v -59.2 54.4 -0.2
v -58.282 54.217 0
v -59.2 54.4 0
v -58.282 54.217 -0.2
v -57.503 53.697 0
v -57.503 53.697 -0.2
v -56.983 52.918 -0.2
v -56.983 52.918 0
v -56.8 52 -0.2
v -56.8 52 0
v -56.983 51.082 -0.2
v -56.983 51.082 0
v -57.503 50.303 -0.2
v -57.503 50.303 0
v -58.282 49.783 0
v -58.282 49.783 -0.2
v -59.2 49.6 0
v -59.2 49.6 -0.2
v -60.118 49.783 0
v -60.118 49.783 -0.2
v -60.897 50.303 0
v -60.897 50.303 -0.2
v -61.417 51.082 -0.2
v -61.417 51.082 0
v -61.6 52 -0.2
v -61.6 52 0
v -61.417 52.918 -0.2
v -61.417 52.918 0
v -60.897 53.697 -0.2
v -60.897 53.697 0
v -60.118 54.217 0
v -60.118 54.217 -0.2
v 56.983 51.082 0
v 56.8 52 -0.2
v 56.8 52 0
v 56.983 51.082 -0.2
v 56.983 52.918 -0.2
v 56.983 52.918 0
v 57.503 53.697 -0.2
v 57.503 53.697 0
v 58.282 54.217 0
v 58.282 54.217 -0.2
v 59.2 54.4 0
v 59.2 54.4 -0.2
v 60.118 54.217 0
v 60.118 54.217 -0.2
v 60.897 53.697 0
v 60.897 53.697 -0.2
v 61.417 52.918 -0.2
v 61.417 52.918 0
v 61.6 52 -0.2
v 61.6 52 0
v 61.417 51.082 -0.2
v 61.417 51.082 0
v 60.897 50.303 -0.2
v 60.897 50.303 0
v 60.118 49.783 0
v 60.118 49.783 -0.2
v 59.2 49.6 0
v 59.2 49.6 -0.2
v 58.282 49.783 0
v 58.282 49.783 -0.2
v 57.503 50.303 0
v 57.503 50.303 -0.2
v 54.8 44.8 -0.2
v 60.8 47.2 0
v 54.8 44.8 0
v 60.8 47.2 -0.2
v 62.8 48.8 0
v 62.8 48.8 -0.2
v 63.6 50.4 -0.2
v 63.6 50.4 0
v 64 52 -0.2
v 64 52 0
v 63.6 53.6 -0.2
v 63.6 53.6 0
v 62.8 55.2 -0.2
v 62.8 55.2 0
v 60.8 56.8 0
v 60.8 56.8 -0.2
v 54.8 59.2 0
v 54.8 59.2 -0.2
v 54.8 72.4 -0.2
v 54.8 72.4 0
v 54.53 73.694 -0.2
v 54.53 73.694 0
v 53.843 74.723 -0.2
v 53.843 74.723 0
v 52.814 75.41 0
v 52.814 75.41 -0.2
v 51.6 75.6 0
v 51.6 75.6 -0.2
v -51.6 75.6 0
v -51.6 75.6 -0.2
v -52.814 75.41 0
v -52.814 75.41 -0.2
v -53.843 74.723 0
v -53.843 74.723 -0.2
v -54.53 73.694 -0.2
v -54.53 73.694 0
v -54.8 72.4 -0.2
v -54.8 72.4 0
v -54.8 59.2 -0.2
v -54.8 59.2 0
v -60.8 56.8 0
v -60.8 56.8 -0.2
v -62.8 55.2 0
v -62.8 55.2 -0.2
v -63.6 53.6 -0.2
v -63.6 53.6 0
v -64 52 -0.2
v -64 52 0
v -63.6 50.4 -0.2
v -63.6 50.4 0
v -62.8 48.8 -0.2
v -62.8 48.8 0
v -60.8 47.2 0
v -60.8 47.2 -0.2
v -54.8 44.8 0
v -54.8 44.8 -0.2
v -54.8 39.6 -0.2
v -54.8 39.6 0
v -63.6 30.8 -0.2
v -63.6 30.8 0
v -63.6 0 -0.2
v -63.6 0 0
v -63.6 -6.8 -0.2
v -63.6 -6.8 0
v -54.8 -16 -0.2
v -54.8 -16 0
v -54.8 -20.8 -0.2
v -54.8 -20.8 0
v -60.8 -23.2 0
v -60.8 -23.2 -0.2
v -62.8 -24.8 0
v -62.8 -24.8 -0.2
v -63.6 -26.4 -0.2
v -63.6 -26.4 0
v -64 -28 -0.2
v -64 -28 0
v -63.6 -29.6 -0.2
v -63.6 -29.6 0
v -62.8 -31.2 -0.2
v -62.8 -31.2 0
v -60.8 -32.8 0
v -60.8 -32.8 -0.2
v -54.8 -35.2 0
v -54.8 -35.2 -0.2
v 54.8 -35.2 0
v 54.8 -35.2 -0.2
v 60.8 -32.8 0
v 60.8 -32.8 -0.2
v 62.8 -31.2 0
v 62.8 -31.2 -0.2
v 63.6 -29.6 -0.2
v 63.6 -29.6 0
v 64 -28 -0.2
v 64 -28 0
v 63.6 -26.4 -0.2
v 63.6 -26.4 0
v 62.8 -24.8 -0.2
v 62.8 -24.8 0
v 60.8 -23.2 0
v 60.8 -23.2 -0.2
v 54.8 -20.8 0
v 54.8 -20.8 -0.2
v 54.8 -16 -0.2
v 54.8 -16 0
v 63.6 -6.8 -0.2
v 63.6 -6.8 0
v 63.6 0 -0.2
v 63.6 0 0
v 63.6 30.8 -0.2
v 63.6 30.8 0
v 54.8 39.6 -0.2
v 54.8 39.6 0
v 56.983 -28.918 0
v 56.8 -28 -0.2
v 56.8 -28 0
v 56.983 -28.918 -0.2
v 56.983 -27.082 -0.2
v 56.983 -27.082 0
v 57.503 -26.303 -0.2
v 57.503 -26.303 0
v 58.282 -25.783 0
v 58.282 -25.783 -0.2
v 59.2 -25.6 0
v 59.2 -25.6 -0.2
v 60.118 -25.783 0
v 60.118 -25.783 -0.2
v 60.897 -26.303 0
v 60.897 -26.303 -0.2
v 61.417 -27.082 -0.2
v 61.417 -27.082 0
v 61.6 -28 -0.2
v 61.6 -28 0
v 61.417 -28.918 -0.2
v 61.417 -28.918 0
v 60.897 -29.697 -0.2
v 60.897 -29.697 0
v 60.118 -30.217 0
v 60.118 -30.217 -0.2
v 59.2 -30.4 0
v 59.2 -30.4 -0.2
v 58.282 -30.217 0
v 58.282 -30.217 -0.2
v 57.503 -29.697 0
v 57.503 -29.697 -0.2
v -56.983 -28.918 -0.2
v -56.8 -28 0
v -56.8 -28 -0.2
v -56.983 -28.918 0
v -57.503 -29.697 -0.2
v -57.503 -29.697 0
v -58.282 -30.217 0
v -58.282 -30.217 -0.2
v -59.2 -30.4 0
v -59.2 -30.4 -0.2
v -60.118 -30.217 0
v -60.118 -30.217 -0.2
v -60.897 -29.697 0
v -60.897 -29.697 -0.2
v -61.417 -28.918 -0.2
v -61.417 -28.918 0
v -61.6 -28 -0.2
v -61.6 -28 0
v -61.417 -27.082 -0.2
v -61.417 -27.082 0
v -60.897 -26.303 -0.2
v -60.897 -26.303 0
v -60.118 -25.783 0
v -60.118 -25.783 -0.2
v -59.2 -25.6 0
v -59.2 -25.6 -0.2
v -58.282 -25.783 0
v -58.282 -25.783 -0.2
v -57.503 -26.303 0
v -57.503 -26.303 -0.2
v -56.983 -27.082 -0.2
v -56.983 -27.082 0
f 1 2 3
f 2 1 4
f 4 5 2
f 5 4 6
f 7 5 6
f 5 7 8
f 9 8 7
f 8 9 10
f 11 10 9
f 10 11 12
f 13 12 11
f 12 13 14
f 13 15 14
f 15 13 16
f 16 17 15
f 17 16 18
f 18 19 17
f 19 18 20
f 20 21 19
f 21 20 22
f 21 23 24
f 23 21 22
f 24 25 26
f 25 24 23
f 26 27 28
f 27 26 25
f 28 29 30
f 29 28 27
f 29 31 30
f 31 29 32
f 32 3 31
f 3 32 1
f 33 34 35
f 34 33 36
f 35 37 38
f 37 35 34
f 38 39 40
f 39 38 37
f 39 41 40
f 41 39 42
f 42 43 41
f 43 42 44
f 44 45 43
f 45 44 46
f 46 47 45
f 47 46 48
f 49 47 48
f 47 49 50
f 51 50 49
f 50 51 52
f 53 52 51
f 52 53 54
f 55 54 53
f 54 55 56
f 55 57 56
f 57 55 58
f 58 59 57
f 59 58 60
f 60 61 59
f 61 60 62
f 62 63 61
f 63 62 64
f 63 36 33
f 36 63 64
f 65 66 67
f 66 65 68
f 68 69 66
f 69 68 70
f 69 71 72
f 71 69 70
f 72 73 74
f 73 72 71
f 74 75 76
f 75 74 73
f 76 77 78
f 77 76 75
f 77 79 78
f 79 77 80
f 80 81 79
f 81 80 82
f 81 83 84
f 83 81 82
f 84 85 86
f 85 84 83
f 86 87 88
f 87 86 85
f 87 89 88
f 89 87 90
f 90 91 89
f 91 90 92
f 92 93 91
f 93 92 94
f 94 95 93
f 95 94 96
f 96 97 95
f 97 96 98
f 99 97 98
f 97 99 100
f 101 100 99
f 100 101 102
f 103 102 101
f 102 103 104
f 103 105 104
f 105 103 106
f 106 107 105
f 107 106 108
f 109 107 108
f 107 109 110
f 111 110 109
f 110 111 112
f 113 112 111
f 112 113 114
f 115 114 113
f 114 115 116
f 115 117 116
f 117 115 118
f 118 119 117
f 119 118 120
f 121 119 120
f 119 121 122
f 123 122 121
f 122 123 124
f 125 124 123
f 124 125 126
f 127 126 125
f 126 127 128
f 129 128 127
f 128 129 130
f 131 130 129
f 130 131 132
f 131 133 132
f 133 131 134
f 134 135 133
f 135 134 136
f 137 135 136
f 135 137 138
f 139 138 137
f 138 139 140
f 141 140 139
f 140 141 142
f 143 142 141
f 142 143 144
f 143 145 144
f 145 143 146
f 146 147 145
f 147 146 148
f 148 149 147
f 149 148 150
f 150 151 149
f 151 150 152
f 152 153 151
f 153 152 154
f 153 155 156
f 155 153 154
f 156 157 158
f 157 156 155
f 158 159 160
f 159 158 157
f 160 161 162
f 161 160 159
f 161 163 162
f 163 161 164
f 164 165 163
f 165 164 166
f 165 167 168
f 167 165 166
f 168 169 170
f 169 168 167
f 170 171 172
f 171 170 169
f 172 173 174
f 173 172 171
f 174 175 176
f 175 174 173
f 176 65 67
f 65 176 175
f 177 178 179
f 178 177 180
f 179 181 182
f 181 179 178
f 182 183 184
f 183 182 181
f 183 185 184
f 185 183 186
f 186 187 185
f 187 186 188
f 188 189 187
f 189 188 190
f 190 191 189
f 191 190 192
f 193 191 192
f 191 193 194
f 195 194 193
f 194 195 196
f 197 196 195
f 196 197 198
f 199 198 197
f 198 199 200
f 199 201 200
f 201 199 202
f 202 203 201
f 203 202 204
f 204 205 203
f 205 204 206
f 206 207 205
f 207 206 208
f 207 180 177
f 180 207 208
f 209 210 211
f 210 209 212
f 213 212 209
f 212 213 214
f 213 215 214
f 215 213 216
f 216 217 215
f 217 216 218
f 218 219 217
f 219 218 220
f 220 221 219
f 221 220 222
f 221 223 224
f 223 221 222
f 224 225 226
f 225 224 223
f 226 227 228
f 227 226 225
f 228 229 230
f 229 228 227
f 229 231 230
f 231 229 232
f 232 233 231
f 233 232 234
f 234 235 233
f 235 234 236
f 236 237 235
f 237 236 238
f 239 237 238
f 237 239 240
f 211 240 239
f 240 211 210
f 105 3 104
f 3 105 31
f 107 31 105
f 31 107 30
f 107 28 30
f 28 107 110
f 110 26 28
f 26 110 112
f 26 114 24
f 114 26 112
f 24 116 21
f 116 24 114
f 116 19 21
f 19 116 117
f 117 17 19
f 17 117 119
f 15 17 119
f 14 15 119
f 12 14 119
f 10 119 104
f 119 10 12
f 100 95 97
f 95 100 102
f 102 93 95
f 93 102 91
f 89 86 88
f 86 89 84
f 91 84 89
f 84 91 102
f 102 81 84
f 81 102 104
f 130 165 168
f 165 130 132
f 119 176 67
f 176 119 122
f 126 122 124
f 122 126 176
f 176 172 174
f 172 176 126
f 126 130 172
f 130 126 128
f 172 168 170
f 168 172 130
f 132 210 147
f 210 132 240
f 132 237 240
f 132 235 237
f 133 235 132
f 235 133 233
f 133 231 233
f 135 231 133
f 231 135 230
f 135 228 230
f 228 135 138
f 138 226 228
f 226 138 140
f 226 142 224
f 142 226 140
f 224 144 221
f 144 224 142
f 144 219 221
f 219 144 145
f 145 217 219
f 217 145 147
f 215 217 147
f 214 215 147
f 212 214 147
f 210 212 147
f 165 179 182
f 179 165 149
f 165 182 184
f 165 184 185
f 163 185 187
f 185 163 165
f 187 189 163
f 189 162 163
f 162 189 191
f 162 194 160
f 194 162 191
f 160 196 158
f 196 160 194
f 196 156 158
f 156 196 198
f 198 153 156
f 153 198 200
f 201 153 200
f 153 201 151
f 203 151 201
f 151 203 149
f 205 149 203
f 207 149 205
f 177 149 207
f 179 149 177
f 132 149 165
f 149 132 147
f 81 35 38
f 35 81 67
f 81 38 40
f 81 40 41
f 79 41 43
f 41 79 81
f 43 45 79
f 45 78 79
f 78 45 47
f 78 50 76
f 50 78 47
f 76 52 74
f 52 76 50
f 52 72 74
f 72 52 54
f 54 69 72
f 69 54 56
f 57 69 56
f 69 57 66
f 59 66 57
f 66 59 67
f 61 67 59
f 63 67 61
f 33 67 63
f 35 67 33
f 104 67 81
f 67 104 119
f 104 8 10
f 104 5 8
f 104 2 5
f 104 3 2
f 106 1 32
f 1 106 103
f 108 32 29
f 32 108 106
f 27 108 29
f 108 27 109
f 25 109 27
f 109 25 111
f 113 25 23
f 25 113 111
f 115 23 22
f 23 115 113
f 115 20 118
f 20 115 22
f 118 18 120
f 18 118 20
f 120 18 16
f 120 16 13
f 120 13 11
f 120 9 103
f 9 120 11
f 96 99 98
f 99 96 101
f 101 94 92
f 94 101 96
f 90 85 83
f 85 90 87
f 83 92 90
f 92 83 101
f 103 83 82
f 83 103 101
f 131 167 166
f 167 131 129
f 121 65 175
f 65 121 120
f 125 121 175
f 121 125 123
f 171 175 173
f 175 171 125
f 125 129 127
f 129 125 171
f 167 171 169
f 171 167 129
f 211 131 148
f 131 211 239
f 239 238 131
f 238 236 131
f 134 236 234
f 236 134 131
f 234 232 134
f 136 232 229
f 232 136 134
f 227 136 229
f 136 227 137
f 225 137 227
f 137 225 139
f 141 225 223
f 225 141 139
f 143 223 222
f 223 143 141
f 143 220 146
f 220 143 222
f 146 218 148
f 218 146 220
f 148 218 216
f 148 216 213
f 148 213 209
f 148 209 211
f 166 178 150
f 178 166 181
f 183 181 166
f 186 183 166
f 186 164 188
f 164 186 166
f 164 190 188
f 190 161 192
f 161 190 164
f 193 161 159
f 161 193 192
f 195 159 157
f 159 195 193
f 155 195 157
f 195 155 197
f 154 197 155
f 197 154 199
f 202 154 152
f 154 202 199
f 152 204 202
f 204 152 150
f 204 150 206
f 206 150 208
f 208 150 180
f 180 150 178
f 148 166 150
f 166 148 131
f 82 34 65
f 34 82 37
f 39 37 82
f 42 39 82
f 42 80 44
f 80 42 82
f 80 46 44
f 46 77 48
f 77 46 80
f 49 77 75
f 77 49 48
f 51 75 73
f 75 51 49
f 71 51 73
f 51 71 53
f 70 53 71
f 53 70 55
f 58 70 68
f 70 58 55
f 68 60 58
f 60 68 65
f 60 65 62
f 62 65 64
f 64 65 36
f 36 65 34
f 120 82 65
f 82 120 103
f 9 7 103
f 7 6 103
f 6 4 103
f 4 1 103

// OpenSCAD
use <../lib.scad>
use <s/u9331s01.scad>
use <s/u9331s02.scad>
function ldraw_lib__28896() = [
// 0 Cardboard Ramp 16 x 14 with Medium Azure Arrow and Chevrons Pattern
// 0 Name: 28896.dat
// 0 Author: Philippe Hurbain [Philo]
// 0 !LDRAW_ORG Part UPDATE 2023-03
// 0 !LICENSE Licensed under CC BY 4.0 : see CAreadme.txt
// 
// 0 BFC CERTIFY CCW
  [0,"BFC","CERTIFY"],
  [0,"BFC","CCW"],
// 
// 0 !CATEGORY Sheet Cardboard
// 0 !KEYWORDS Set 42059, Stunt Truck
// 
// 0 !HISTORY 2023-06-24 [OrionP] Official Update 2023-03
// 
// 
// 1 16 0 0 0 1 0 0 0 1 0 0 0 1 s\u9331s01.dat
  [1,16,0,0,0,1,0,0,0,1,0,0,0,1, ldraw_lib__s__u9331s01()],
// 0 !TEXMAP START PLANAR -160 0 189 160 0 189 -160 0 -88 28896.png
// 0 !: 1 16 0 0 0 1 0 0 0 1 0 0 0 1 s\u9331s02.dat
// 0 !TEXMAP FALLBACK
// 1 16 0 0 0 1 0 0 0 1 0 0 0 1 s\u9331s02.dat
  [1,16,0,0,0,1,0,0,0,1,0,0,0,1, ldraw_lib__s__u9331s02()],
// 0 !TEXMAP END
// 1 16 0 0.5 0 1 0 0 0 -1 0 0 0 1 s\u9331s02.dat
  [1,16,0,0.5,0,1,0,0,0,-1,0,0,0,1, ldraw_lib__s__u9331s02()],
];
module ldraw_lib__28896(step=0, col=false, unit=2/5, alt=false, line=0.2, solid=!$preview)
    makepoly(ldraw_lib__28896(), step=step, col=col, unit=unit, alt=alt, line=line, solid=solid);
ldraw_lib__28896(line=0.2);
